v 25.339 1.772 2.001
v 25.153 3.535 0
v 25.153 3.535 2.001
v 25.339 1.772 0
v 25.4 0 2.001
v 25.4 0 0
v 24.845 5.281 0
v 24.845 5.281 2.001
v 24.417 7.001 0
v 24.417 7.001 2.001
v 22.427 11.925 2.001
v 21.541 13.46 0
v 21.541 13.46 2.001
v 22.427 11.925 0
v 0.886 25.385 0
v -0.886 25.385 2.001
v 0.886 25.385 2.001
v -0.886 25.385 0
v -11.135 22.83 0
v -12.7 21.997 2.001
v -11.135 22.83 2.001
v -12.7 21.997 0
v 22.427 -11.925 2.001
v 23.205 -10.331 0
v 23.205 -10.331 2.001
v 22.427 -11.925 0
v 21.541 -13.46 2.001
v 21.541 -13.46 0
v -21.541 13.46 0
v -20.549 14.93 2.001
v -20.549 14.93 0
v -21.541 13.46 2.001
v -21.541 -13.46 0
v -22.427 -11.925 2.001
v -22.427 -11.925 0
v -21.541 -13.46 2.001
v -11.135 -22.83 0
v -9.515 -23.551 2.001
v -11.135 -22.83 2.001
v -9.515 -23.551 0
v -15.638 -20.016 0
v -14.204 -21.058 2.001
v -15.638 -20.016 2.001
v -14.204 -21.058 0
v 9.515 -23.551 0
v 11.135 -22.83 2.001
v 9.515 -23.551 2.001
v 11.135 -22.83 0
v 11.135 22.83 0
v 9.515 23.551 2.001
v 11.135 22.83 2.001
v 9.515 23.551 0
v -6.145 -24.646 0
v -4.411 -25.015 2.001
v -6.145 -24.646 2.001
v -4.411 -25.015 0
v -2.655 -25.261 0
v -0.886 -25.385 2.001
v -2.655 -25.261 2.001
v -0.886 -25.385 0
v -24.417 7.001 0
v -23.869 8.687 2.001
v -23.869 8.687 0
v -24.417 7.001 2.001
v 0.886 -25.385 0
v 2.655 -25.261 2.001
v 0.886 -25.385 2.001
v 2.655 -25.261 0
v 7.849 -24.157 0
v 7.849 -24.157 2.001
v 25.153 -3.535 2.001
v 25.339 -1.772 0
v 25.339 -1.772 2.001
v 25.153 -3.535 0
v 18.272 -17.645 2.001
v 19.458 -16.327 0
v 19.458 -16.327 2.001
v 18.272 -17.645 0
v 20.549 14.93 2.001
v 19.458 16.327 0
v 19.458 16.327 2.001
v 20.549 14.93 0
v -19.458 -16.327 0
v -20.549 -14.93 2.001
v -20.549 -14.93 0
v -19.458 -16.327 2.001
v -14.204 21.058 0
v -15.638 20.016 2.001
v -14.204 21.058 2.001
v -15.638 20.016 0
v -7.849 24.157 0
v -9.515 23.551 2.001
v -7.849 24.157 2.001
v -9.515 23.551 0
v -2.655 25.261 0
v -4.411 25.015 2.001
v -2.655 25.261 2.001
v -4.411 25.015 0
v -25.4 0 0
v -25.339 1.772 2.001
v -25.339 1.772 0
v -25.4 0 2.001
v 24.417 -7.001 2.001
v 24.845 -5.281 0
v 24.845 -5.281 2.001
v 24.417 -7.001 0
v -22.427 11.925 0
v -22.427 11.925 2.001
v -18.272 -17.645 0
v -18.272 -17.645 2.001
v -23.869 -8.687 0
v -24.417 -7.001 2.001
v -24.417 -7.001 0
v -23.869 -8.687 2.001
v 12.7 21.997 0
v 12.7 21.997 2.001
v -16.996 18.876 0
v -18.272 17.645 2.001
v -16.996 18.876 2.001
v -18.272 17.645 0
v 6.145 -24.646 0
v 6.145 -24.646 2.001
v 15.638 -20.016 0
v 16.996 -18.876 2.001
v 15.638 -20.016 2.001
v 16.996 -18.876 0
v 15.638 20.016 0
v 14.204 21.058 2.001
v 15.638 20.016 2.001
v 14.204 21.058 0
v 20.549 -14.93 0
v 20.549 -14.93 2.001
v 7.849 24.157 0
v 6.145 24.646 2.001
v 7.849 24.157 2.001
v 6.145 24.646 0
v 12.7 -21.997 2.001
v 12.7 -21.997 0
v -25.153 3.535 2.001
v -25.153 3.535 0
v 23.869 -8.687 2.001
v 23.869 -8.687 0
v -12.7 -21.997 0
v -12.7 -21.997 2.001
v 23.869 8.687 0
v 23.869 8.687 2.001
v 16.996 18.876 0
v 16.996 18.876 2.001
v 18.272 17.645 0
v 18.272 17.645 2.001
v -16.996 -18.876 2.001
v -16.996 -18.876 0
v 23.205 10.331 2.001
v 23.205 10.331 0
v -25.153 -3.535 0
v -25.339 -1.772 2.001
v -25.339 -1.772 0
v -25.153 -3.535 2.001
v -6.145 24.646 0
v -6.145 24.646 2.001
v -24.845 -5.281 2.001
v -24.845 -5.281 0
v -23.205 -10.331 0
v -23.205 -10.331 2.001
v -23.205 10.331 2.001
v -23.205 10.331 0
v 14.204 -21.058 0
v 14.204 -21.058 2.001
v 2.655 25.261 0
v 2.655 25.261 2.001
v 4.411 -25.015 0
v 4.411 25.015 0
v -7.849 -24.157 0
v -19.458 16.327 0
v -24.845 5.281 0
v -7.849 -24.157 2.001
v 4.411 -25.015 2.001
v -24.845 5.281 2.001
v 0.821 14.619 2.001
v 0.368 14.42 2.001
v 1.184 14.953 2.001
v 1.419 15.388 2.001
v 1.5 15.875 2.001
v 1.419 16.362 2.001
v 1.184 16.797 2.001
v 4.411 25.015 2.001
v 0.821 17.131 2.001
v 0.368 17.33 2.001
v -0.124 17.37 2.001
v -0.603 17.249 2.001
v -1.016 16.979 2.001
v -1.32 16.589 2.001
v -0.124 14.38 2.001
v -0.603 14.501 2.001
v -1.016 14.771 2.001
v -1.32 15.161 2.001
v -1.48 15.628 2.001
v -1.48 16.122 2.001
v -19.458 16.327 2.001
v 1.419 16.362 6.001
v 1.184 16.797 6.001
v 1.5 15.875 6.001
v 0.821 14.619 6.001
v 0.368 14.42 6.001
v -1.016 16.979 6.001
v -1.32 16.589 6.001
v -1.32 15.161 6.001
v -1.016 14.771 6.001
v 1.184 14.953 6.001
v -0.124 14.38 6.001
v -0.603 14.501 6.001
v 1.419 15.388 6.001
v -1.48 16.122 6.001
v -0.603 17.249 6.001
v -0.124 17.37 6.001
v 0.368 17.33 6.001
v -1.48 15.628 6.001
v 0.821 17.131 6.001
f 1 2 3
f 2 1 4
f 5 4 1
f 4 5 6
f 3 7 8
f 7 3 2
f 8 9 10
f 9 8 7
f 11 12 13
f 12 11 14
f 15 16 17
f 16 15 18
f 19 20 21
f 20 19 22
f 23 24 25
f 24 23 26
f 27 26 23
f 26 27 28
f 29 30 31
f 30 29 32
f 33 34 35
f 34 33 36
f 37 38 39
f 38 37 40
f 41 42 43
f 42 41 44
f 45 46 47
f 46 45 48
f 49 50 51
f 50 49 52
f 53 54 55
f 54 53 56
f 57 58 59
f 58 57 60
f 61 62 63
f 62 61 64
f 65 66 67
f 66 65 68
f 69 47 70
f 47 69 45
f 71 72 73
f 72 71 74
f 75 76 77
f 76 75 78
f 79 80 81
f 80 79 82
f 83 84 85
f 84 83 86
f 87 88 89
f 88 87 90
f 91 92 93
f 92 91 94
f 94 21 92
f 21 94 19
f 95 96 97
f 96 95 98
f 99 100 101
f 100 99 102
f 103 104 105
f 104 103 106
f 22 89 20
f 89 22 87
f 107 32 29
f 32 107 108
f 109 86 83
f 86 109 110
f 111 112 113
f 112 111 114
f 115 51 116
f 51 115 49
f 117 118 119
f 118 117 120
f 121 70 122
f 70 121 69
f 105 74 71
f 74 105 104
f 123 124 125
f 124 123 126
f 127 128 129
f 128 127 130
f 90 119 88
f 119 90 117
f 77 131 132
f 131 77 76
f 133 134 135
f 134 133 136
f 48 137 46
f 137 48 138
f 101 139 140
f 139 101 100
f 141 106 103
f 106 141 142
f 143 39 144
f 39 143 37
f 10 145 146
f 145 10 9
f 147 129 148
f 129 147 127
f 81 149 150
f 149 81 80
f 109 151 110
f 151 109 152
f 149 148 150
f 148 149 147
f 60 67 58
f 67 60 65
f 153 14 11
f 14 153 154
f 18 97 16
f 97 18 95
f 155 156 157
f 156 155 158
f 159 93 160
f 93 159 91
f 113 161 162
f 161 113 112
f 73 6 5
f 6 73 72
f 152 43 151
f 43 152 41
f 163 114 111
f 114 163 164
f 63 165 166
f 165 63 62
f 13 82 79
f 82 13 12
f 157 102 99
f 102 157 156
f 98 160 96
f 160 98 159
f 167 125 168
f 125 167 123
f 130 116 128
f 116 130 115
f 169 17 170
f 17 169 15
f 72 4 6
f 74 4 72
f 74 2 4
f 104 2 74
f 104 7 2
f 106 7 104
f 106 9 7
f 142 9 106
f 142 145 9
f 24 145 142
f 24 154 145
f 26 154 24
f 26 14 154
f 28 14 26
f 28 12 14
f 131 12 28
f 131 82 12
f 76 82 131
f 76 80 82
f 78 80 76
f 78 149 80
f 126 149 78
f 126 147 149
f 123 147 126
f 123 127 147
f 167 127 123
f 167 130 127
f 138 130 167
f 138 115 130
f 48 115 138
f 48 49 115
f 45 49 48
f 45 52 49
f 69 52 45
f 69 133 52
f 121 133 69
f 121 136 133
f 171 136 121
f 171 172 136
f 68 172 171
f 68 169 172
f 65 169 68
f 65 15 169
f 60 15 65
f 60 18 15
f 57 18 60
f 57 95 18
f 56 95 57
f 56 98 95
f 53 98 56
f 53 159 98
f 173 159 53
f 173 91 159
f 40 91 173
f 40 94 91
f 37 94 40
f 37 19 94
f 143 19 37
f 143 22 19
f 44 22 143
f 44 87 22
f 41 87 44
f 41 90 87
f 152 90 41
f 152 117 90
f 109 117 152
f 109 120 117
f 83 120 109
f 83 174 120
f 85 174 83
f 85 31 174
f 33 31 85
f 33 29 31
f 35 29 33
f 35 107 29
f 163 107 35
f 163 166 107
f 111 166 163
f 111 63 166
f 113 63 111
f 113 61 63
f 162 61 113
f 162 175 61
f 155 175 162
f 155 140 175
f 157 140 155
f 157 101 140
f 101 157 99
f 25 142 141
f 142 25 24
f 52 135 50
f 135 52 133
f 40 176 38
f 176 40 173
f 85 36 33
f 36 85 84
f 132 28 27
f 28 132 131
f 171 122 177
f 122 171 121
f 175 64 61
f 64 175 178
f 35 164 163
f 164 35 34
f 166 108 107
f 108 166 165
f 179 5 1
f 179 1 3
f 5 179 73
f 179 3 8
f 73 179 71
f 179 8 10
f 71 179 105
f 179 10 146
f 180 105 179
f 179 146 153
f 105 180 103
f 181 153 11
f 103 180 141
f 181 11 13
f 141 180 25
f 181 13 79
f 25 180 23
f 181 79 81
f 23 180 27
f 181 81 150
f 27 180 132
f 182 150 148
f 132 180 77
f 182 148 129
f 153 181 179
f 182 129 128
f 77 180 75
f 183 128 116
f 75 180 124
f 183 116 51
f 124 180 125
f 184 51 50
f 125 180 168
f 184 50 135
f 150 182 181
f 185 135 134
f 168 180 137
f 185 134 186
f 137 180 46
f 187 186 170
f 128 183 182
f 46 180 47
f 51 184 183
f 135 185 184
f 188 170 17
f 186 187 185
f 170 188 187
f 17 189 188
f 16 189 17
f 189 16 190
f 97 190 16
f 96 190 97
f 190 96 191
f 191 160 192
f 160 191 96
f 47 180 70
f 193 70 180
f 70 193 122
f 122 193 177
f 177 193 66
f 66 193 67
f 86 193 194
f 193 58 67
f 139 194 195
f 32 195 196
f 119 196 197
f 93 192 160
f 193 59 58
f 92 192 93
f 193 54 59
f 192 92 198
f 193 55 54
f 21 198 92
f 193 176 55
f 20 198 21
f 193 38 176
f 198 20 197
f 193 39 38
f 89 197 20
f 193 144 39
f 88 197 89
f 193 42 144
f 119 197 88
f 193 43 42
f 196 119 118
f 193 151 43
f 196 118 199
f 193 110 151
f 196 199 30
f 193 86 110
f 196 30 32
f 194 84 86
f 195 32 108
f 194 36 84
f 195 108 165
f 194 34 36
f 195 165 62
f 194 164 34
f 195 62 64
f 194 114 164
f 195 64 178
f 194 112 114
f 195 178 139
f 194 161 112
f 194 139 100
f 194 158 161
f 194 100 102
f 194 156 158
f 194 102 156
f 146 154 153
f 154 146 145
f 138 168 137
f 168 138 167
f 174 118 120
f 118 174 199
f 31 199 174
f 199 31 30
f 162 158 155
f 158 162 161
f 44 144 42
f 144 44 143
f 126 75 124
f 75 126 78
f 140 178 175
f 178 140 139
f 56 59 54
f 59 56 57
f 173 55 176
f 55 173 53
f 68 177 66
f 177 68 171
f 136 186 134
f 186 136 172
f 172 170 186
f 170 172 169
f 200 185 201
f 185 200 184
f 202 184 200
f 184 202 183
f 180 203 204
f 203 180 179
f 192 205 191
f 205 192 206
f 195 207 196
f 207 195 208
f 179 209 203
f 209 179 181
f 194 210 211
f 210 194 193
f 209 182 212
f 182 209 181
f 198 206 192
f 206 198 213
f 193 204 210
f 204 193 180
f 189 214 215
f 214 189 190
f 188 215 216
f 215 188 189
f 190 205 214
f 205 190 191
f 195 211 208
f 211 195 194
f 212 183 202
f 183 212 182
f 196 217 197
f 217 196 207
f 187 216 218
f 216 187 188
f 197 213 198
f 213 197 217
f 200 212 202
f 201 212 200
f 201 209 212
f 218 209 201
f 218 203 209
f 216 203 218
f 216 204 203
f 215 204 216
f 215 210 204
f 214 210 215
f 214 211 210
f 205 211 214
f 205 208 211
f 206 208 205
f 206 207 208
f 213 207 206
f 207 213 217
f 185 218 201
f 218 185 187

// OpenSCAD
//Customizer Variables

// Specify the shape of the base
base_shape = 90;//[90:round,3:triangle,4:square,5:pentagon,6:hexagon,7:heptagon,8:octagon,10:decagon,12:dodecagon]

// Most display stands appear to be around 2 to 3.175 mm in height
base_height = 2;
base_diameter = 50.8;

// This section displays the peg measurement options

peg_height = 4;
peg_diameter = 3;

// This section displays the peg position.  Note the z offset is not customizable.  The peg_height should account for a z position of 0 and add the hight of the base to the size of the peg.  
// Default is a 6mm peg + base height

// If both X & Y offset are 0 peg will be centered
peg_x_offset = 0;
peg_y_offset = 15.875;

/* [Hidden] */
// Add a tolerance level of 0.001 mm to prevent zero sized prints
// This is small enough that it should not be noticeable to any printers

tolerance = 0.001;

// Create the base

if(base_shape == 3)
{   
    //Triangle base
    
    rotate([0,0,90]) cylinder(h=base_height+tolerance, d=base_diameter+tolerance, $fa=1, $fn=base_shape);
}

else 
{
    //All other shapes
    
    cylinder(h=base_height+tolerance, d=base_diameter+tolerance, $fa=1, $fn=base_shape);
}


//create the peg

translate([peg_x_offset, peg_y_offset, 0])
   cylinder(h=peg_height+tolerance+base_height, d=peg_diameter+tolerance, $fa=1, $fs=0.5);
